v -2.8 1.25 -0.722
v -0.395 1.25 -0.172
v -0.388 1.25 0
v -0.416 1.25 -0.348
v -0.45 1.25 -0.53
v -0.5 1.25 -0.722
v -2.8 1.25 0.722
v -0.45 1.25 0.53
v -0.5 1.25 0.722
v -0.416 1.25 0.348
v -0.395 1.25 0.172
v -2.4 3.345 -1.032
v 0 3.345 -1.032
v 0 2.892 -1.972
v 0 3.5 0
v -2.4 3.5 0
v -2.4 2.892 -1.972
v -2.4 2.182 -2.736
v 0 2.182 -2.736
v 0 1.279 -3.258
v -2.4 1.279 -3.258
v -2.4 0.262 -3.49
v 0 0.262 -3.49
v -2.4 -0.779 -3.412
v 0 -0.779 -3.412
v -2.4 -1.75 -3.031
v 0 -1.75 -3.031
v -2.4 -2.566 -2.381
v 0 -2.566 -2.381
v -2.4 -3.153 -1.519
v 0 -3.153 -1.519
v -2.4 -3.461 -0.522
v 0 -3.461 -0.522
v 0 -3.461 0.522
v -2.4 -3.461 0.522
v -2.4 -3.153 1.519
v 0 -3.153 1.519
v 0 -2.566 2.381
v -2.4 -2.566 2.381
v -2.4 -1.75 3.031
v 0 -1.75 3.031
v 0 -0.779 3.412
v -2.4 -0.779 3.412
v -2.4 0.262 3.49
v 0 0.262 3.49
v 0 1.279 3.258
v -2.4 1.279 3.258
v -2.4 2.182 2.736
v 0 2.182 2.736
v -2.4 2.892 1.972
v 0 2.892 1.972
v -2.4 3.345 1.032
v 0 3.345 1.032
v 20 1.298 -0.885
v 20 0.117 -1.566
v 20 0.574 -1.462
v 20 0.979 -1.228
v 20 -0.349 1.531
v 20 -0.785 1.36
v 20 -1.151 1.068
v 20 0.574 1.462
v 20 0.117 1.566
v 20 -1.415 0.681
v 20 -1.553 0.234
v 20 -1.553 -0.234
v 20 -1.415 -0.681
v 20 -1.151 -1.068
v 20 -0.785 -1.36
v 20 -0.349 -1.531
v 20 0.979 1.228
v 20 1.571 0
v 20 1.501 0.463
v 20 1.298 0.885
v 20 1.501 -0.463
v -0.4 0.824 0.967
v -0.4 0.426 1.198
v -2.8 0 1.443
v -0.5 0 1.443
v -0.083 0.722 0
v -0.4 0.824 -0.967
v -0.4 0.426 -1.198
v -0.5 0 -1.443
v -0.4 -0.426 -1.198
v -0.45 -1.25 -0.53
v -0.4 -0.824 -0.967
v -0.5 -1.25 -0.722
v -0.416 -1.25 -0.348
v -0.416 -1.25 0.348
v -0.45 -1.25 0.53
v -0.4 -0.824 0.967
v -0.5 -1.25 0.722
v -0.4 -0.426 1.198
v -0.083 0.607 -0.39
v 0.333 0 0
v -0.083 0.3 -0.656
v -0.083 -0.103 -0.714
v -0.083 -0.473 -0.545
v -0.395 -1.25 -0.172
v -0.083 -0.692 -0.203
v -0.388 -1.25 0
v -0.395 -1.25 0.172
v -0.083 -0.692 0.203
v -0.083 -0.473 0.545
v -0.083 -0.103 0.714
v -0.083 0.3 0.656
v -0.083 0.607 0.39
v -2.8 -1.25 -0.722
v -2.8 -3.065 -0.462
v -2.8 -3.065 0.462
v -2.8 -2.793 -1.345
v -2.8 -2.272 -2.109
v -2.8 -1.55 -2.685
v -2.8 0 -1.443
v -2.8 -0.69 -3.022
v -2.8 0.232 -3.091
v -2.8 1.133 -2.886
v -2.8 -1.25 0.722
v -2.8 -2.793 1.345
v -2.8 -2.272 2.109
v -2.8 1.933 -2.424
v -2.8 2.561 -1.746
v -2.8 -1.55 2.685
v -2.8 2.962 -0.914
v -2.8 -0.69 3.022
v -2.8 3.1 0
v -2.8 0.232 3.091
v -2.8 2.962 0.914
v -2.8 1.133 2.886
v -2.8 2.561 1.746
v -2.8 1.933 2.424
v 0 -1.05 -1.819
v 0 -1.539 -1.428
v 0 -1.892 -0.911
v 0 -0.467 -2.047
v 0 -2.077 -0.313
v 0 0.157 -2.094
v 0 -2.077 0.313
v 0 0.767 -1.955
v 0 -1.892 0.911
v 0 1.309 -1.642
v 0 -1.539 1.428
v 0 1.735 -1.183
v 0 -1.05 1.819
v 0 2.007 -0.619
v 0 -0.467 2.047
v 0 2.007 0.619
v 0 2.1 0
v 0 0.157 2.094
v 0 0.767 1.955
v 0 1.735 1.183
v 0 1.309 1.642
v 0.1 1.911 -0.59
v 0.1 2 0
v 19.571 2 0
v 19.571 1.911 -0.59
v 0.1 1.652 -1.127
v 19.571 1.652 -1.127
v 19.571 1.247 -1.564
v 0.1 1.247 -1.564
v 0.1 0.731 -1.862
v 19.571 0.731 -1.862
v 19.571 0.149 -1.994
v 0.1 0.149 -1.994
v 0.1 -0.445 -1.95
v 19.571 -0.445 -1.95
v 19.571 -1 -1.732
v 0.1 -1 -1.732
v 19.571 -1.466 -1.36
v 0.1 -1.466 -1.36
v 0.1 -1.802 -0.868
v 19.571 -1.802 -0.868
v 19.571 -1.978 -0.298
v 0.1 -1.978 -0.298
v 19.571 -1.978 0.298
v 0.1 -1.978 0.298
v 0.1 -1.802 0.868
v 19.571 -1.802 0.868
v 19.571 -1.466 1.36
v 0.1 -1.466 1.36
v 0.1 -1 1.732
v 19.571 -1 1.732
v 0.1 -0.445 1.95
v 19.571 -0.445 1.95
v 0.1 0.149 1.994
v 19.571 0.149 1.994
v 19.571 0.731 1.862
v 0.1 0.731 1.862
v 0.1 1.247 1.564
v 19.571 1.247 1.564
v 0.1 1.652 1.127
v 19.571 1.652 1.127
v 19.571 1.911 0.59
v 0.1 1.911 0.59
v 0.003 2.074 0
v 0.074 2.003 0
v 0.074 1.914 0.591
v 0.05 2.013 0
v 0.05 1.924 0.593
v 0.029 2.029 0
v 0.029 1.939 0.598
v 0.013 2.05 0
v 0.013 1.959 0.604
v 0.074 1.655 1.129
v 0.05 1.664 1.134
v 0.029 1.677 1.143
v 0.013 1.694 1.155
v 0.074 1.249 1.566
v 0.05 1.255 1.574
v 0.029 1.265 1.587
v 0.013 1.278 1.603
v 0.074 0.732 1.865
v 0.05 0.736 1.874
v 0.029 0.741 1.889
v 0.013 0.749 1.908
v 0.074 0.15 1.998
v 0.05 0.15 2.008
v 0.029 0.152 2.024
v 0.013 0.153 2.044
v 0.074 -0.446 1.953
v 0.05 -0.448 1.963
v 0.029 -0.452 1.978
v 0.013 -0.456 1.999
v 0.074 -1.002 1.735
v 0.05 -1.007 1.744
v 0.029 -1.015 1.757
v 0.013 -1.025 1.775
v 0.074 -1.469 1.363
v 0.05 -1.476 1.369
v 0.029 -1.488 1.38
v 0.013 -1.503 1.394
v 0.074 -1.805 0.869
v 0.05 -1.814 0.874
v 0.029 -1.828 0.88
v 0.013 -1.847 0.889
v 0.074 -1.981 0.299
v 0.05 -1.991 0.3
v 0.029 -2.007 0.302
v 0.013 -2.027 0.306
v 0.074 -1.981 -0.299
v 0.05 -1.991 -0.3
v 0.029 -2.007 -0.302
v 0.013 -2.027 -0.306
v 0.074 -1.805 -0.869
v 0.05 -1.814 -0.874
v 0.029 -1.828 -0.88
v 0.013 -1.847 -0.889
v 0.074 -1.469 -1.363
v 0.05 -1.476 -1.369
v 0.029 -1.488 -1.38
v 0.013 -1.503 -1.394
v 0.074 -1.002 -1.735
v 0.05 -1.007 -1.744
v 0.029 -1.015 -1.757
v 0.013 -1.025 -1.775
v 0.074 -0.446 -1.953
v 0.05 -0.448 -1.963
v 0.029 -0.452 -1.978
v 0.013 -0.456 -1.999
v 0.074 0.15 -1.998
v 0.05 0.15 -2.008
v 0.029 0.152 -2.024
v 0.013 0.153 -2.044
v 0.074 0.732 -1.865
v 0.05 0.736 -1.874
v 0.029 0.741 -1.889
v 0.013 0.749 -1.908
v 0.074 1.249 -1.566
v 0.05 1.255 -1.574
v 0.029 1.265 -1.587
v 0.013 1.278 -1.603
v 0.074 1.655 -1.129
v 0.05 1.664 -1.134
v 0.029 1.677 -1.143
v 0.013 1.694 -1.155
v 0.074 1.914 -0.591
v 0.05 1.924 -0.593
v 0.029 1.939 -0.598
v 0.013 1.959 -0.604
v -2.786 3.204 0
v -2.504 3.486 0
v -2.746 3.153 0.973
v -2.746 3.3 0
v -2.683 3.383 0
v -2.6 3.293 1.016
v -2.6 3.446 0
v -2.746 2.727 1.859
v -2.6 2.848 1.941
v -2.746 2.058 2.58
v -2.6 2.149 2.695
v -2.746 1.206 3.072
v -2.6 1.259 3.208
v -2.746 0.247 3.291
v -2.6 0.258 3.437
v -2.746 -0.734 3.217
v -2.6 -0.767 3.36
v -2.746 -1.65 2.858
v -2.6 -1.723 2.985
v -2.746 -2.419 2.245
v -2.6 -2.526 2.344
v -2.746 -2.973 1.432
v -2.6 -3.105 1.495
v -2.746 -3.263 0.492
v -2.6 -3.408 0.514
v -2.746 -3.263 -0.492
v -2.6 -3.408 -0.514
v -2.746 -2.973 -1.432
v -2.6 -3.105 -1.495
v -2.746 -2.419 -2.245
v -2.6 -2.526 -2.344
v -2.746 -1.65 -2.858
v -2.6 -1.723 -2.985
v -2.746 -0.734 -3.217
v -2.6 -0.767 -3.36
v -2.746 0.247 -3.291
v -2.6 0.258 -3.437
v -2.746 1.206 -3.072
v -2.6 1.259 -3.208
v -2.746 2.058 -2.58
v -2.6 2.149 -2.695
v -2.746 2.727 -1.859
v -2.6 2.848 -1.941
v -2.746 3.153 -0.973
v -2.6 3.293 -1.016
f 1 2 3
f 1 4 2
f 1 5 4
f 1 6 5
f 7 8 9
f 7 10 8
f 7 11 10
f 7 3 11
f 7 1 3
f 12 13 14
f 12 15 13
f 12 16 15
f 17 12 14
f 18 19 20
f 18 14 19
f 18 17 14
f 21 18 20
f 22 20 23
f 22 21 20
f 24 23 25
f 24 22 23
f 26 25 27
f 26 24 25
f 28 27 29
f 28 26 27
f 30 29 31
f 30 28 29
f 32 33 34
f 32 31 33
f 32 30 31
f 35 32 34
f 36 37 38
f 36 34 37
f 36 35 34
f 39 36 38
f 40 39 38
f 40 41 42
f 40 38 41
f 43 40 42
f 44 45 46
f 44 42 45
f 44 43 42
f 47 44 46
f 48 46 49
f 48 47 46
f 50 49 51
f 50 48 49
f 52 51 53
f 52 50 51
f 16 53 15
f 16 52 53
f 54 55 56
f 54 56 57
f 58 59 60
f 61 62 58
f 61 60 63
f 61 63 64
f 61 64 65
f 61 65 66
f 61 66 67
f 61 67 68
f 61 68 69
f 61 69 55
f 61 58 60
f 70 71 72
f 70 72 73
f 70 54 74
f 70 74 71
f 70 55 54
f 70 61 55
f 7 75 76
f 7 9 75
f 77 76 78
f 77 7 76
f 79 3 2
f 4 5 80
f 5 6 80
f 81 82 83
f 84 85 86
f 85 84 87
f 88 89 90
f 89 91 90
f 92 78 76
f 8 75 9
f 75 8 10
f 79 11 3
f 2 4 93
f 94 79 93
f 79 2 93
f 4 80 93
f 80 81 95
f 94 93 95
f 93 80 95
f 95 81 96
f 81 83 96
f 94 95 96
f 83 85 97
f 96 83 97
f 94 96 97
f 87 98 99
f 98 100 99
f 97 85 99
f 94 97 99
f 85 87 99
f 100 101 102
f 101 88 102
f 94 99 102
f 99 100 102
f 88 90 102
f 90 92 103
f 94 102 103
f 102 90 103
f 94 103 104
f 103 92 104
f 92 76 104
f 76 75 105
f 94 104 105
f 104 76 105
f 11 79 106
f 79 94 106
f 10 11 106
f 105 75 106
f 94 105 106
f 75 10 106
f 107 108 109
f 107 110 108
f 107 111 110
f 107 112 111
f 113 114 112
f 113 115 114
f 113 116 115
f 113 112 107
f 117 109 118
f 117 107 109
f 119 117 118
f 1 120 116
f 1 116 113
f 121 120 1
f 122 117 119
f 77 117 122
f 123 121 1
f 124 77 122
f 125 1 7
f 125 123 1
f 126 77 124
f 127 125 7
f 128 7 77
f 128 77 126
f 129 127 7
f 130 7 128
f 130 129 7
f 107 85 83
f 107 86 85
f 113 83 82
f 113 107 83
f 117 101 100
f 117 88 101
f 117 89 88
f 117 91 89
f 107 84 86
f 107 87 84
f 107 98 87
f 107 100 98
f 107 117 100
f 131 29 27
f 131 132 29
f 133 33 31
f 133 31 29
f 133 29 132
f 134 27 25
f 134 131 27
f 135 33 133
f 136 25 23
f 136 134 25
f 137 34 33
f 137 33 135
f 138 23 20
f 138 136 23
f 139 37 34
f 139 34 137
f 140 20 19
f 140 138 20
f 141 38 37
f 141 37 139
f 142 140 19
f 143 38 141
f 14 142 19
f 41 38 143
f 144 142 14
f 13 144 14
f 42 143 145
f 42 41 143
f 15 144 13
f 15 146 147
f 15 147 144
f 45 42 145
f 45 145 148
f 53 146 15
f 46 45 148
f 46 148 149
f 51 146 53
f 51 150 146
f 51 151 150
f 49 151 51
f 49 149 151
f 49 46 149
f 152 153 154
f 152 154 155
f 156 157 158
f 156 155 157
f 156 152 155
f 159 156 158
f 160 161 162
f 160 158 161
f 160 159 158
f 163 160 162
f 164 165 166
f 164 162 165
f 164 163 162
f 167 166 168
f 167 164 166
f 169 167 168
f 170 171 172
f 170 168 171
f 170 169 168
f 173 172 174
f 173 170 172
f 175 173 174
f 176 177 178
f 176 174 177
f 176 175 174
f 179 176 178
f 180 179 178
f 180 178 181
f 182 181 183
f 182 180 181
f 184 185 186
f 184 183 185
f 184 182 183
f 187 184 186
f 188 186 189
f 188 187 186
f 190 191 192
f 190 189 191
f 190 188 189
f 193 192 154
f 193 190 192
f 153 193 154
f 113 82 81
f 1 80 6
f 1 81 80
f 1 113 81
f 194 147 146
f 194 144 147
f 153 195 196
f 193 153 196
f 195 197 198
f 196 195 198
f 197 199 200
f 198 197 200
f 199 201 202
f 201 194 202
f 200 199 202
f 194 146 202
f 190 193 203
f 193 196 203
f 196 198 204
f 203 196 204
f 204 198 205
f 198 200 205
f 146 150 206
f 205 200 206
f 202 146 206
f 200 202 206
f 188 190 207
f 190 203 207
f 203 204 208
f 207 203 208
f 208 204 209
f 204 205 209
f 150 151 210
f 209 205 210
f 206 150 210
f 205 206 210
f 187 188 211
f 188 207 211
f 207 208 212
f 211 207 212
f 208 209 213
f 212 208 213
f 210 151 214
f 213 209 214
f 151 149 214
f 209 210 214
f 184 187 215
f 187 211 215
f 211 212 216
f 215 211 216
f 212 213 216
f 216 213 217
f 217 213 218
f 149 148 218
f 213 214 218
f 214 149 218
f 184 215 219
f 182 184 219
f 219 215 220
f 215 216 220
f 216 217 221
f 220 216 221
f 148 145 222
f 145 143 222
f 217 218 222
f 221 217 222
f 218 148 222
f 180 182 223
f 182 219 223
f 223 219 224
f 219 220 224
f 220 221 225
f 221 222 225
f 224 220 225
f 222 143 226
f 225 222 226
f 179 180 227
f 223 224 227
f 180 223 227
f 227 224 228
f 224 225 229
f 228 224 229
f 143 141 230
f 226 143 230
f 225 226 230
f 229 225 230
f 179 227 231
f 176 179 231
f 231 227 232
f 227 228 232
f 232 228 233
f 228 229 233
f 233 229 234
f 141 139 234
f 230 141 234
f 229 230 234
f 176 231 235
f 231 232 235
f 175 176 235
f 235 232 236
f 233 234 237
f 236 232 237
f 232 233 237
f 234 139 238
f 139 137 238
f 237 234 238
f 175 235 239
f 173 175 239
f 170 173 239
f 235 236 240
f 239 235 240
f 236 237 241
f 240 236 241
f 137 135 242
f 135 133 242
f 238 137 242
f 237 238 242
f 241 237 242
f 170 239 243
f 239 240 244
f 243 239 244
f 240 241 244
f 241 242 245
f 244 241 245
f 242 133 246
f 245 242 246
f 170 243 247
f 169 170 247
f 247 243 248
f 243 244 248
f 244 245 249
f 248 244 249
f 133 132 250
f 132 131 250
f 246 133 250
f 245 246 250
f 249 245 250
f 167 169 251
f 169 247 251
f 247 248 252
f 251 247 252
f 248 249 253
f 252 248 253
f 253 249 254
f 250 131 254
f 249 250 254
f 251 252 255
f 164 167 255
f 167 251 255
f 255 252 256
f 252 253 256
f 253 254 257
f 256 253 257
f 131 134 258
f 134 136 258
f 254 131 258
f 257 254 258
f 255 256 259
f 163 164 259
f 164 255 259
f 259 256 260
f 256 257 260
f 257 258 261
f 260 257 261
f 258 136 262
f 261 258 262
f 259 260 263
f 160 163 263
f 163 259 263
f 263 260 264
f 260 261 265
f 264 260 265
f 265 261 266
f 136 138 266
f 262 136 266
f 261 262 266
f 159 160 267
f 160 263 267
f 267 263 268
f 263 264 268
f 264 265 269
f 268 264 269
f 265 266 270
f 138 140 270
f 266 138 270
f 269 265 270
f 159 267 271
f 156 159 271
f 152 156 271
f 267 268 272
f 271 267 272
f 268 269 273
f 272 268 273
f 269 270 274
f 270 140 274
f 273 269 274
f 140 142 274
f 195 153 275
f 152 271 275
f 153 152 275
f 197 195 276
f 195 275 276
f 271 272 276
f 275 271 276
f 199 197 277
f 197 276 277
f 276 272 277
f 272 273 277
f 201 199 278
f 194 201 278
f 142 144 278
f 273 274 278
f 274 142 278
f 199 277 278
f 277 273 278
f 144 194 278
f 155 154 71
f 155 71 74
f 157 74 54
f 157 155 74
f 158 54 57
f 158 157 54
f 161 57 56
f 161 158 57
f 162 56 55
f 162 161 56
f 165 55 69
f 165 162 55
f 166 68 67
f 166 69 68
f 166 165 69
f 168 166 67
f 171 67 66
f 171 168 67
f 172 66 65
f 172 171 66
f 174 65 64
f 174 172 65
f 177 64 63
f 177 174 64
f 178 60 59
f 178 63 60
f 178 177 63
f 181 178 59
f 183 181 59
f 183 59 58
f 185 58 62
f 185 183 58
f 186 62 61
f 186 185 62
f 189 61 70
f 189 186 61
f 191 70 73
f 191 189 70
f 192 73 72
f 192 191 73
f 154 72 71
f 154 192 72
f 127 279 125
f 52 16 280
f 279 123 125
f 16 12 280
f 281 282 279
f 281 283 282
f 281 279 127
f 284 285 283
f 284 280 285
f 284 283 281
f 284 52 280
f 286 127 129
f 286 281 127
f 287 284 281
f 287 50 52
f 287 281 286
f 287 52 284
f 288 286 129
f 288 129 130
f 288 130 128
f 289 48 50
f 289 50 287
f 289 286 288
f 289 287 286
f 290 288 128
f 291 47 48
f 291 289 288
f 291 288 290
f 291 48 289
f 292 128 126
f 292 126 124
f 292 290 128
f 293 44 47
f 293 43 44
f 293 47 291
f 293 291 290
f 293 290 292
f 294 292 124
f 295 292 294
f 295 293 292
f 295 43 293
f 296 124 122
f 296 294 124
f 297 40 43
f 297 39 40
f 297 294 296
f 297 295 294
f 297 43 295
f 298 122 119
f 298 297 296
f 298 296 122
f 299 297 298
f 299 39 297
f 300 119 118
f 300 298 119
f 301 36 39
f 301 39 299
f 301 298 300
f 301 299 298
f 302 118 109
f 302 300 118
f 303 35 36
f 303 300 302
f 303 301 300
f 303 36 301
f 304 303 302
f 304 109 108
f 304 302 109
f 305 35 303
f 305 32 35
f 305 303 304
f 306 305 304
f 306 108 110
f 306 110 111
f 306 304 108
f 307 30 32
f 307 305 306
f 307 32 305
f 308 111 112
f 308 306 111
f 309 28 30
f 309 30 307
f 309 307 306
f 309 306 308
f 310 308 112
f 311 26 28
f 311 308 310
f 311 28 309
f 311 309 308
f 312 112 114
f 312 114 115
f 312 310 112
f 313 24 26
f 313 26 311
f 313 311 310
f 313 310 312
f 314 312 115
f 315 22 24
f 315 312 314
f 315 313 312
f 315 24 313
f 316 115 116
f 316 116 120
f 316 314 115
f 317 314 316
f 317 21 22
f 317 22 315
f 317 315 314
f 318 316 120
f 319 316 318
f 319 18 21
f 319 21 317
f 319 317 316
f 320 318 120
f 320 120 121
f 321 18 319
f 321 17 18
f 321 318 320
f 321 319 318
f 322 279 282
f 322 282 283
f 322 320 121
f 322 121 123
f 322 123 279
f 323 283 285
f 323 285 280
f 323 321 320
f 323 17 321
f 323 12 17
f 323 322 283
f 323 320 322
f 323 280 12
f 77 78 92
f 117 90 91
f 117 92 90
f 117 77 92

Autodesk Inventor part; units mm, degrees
ref_plane "YZ Plane" through (0, 0, 0) normal (1, 0, 0) x (0, 1, 0)
ref_plane "XZ Plane" through (0, 0, 0) normal (0, 1, 0) x (-1, 0, 0)
sketch "Sketch1" plane through (0, 0, 0) normal (0, 0, 1) x (1, 0, 0)
  line L0 (0.3333, 0) -> (20, 0)
  line L1 (20, 0) -> (20, 2)
  line L2 (20, 2) -> (2.1, 2)
  line L3 (2.1, 2) -> (1.6705, 2)
  line L4 (1.6705, 2) -> (0, 2)
  line L5 (0, 2) -> (0, 3.5)
  line L6 (0, 3.5) -> (-2.8, 3.5)
  line L7 (-2.8, 3.5) -> (-2.8, 1.4434)
  line L8 (-2.8, 1.4434) -> (-0.5, 1.4434)
  line L9 (-0.5, 1.4434) -> (0.3333, 0)
  line L10 (-7.36, 0) -> (24.56, 0) projected
  line L11 (0, -0.7) -> (0, 4.2) projected
  line L12 (2.1, 2) -> (0, 2) construction
  dimension "d1" = 17.9
  dimension "d2" = 0.4295
  dimension "d3" = 2.8
  dimension "d4" = 2.3
  dimension "d5" = 60
  dimension "d6" = 4
  dimension "d7" = 4
  dimension "d8" = 2.8868
  dimension "d9" = 7
  dimension "d26" = 20
revolve "Body" add sketch "Sketch1" angle 360 about axis through (0.3333, 0, 0) along (1, 0, 0) contours L9 L11 L4 L3 L2 L1 L0 | L9 L8 L7 L6 L5 L11
sketch "Sketch2" plane through (-2.8, 0, 0) normal (-1, 0, 0) x (0, 0, 1)
  circle A0 centre (0, 0) radius 1.4434 projected
  line L0 (0, -4.9) -> (0, 4.9) projected
  line L1 (-4.9, 0) -> (4.9, 0) projected
  line L2 (1.4434, 0) -> (0.7217, -1.25)
  line L3 (0.7217, -1.25) -> (-0.7217, -1.25)
  line L4 (-0.7217, -1.25) -> (-1.4434, 0)
  line L5 (-1.4434, 0) -> (-0.7217, 1.25)
  line L6 (-0.7217, 1.25) -> (0.7217, 1.25)
  line L7 (0.7217, 1.25) -> (1.4434, 0)
  point P0 (0, 0)
extrude "Slot" add sketch "Sketch2" against normal up to next contours L7 A0 | A0 L2 | L6 L0 A0 | A0 L0 L3 | L0 L6 A0 | A0 L3 L0 | L4 A0 | A0 L5
fillet "Fillet1" radius 0.4 1 edges at (-2.8, -3.5, 0)
thread "Thread" size "M4x0.7" class "6g" standard "ISO Metric profile" length 17.9
chamfer "Chamfer1" distance 0.4294 distance2 0.4294 1 edges at (20, -2, 0) measured on face at (20, 0.527, -0.2661)
ref_plane "Work Plane1" through (29, 0, 0) normal (0, -1, 0) x (1, 0, 0)
fillet "Fillet2" radius 0.1 1 edges at (0, -2, 0)
equation "\"d1\" = GEL"
equation "\"d3\" = KOH"
equation "\"d4\" = INTI"
equation "\"d6\" = GD"
equation "\"d7\" = BDM"
equation "\"d8\" = 1.1547 * SW"
equation "\"d9\" = KOD"
equation "\"d26\" = NLG"
equation "\"d30\" = R"
equation "\"d17\" = RR"
equation "\"d13\" = GEL"
equation "\"d15\" = -0.5 * SPD + 0.5 * GD"
equation "\"d16\" = GUL"
equation "\"GD\" = NND"
equation "\"NLG\" = 20"
equation "\"GEL\" = 17.9"
equation "\"KOD\" = 7"
equation "\"KOH\" = 2.8"
equation "\"INTI\" = 2.3"
equation "\"GAL\" = 0.61345 * PTC"
equation "\"GUL\" = 0.61345 * PTC"
equation "\"BDM\" = NND"
equation "\"SW\" = 2.5"
equation "\"RR\" = 0.4"
equation "\"SPD\" = NND - 1.2269 * PTC"
equation "\"R\" = 0.1"
equation "\"TOA\" = 30deg"
equation "\"GD1\" = THREADDIA - 1.2269 * PTC"
equation "\"THREADDIA\" = 4"
equation "\"FAWI\" = 45deg"
equation "\"ANG\" = 120deg"
equation "\"PTC\" = 0.7"
equation "\"NND\" = 4"
equation "\"E0\" = 1.155 * SW"
properties part number "DIN 7984 - M4 x 20" material "Steel, Mild"
